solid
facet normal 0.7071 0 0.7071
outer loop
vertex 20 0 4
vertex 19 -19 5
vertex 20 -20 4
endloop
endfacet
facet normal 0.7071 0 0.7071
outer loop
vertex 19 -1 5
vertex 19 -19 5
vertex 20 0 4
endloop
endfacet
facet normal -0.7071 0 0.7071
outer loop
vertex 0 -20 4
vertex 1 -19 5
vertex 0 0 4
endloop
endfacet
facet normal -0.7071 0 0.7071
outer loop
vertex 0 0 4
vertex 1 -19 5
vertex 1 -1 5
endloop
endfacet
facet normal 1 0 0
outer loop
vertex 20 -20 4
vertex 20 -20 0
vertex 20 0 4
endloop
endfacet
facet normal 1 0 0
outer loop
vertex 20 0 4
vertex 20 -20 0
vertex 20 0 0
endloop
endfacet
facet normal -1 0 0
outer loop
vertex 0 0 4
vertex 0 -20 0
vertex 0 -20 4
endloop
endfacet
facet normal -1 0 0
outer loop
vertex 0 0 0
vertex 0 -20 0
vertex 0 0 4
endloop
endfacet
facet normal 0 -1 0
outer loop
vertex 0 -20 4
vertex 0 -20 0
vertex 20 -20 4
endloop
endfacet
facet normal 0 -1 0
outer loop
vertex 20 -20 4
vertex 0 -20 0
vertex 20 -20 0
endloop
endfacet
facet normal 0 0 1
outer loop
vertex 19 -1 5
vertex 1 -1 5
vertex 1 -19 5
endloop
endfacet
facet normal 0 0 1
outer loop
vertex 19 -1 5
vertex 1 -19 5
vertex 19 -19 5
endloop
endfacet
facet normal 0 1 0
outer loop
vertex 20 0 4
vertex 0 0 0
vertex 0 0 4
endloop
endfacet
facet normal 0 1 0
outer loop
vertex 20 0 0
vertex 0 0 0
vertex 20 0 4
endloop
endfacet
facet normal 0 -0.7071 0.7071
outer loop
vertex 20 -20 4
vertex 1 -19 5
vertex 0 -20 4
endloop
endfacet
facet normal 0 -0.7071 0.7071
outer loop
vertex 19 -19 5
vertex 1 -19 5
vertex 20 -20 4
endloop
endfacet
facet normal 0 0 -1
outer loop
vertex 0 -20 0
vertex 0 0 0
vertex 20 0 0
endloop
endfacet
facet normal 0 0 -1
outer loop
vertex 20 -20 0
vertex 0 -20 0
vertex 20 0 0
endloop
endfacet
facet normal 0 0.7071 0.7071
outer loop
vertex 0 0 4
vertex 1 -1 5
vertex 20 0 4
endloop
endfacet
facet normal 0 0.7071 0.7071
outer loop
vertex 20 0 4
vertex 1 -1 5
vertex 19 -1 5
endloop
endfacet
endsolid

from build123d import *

# Parameters (mm, degrees)
ESQUISSE1_W        = 20
ESQUISSE1_H        = 20
BOSS_EXTRU_1_DEPTH = 5
CHANFREIN1_SIZE    = 1


with BuildPart() as part:
    # Esquisse1 → Boss.-Extru.1 (new body)
    with BuildSketch(Plane.XY):
        with Locations((10, -10)):
            Rectangle(ESQUISSE1_W, ESQUISSE1_H)
    extrude(amount=BOSS_EXTRU_1_DEPTH)

    # Chanfrein1
    chanfrein1_edges = [part.edges().sort_by_distance(p)[0] for p in [
        (20, -10, 5),
        (10, 0, 5),
        (0, -10, 5),
        (10, -20, 5),
    ]]
    chamfer(chanfrein1_edges, length=CHANFREIN1_SIZE)


solid = part.part
